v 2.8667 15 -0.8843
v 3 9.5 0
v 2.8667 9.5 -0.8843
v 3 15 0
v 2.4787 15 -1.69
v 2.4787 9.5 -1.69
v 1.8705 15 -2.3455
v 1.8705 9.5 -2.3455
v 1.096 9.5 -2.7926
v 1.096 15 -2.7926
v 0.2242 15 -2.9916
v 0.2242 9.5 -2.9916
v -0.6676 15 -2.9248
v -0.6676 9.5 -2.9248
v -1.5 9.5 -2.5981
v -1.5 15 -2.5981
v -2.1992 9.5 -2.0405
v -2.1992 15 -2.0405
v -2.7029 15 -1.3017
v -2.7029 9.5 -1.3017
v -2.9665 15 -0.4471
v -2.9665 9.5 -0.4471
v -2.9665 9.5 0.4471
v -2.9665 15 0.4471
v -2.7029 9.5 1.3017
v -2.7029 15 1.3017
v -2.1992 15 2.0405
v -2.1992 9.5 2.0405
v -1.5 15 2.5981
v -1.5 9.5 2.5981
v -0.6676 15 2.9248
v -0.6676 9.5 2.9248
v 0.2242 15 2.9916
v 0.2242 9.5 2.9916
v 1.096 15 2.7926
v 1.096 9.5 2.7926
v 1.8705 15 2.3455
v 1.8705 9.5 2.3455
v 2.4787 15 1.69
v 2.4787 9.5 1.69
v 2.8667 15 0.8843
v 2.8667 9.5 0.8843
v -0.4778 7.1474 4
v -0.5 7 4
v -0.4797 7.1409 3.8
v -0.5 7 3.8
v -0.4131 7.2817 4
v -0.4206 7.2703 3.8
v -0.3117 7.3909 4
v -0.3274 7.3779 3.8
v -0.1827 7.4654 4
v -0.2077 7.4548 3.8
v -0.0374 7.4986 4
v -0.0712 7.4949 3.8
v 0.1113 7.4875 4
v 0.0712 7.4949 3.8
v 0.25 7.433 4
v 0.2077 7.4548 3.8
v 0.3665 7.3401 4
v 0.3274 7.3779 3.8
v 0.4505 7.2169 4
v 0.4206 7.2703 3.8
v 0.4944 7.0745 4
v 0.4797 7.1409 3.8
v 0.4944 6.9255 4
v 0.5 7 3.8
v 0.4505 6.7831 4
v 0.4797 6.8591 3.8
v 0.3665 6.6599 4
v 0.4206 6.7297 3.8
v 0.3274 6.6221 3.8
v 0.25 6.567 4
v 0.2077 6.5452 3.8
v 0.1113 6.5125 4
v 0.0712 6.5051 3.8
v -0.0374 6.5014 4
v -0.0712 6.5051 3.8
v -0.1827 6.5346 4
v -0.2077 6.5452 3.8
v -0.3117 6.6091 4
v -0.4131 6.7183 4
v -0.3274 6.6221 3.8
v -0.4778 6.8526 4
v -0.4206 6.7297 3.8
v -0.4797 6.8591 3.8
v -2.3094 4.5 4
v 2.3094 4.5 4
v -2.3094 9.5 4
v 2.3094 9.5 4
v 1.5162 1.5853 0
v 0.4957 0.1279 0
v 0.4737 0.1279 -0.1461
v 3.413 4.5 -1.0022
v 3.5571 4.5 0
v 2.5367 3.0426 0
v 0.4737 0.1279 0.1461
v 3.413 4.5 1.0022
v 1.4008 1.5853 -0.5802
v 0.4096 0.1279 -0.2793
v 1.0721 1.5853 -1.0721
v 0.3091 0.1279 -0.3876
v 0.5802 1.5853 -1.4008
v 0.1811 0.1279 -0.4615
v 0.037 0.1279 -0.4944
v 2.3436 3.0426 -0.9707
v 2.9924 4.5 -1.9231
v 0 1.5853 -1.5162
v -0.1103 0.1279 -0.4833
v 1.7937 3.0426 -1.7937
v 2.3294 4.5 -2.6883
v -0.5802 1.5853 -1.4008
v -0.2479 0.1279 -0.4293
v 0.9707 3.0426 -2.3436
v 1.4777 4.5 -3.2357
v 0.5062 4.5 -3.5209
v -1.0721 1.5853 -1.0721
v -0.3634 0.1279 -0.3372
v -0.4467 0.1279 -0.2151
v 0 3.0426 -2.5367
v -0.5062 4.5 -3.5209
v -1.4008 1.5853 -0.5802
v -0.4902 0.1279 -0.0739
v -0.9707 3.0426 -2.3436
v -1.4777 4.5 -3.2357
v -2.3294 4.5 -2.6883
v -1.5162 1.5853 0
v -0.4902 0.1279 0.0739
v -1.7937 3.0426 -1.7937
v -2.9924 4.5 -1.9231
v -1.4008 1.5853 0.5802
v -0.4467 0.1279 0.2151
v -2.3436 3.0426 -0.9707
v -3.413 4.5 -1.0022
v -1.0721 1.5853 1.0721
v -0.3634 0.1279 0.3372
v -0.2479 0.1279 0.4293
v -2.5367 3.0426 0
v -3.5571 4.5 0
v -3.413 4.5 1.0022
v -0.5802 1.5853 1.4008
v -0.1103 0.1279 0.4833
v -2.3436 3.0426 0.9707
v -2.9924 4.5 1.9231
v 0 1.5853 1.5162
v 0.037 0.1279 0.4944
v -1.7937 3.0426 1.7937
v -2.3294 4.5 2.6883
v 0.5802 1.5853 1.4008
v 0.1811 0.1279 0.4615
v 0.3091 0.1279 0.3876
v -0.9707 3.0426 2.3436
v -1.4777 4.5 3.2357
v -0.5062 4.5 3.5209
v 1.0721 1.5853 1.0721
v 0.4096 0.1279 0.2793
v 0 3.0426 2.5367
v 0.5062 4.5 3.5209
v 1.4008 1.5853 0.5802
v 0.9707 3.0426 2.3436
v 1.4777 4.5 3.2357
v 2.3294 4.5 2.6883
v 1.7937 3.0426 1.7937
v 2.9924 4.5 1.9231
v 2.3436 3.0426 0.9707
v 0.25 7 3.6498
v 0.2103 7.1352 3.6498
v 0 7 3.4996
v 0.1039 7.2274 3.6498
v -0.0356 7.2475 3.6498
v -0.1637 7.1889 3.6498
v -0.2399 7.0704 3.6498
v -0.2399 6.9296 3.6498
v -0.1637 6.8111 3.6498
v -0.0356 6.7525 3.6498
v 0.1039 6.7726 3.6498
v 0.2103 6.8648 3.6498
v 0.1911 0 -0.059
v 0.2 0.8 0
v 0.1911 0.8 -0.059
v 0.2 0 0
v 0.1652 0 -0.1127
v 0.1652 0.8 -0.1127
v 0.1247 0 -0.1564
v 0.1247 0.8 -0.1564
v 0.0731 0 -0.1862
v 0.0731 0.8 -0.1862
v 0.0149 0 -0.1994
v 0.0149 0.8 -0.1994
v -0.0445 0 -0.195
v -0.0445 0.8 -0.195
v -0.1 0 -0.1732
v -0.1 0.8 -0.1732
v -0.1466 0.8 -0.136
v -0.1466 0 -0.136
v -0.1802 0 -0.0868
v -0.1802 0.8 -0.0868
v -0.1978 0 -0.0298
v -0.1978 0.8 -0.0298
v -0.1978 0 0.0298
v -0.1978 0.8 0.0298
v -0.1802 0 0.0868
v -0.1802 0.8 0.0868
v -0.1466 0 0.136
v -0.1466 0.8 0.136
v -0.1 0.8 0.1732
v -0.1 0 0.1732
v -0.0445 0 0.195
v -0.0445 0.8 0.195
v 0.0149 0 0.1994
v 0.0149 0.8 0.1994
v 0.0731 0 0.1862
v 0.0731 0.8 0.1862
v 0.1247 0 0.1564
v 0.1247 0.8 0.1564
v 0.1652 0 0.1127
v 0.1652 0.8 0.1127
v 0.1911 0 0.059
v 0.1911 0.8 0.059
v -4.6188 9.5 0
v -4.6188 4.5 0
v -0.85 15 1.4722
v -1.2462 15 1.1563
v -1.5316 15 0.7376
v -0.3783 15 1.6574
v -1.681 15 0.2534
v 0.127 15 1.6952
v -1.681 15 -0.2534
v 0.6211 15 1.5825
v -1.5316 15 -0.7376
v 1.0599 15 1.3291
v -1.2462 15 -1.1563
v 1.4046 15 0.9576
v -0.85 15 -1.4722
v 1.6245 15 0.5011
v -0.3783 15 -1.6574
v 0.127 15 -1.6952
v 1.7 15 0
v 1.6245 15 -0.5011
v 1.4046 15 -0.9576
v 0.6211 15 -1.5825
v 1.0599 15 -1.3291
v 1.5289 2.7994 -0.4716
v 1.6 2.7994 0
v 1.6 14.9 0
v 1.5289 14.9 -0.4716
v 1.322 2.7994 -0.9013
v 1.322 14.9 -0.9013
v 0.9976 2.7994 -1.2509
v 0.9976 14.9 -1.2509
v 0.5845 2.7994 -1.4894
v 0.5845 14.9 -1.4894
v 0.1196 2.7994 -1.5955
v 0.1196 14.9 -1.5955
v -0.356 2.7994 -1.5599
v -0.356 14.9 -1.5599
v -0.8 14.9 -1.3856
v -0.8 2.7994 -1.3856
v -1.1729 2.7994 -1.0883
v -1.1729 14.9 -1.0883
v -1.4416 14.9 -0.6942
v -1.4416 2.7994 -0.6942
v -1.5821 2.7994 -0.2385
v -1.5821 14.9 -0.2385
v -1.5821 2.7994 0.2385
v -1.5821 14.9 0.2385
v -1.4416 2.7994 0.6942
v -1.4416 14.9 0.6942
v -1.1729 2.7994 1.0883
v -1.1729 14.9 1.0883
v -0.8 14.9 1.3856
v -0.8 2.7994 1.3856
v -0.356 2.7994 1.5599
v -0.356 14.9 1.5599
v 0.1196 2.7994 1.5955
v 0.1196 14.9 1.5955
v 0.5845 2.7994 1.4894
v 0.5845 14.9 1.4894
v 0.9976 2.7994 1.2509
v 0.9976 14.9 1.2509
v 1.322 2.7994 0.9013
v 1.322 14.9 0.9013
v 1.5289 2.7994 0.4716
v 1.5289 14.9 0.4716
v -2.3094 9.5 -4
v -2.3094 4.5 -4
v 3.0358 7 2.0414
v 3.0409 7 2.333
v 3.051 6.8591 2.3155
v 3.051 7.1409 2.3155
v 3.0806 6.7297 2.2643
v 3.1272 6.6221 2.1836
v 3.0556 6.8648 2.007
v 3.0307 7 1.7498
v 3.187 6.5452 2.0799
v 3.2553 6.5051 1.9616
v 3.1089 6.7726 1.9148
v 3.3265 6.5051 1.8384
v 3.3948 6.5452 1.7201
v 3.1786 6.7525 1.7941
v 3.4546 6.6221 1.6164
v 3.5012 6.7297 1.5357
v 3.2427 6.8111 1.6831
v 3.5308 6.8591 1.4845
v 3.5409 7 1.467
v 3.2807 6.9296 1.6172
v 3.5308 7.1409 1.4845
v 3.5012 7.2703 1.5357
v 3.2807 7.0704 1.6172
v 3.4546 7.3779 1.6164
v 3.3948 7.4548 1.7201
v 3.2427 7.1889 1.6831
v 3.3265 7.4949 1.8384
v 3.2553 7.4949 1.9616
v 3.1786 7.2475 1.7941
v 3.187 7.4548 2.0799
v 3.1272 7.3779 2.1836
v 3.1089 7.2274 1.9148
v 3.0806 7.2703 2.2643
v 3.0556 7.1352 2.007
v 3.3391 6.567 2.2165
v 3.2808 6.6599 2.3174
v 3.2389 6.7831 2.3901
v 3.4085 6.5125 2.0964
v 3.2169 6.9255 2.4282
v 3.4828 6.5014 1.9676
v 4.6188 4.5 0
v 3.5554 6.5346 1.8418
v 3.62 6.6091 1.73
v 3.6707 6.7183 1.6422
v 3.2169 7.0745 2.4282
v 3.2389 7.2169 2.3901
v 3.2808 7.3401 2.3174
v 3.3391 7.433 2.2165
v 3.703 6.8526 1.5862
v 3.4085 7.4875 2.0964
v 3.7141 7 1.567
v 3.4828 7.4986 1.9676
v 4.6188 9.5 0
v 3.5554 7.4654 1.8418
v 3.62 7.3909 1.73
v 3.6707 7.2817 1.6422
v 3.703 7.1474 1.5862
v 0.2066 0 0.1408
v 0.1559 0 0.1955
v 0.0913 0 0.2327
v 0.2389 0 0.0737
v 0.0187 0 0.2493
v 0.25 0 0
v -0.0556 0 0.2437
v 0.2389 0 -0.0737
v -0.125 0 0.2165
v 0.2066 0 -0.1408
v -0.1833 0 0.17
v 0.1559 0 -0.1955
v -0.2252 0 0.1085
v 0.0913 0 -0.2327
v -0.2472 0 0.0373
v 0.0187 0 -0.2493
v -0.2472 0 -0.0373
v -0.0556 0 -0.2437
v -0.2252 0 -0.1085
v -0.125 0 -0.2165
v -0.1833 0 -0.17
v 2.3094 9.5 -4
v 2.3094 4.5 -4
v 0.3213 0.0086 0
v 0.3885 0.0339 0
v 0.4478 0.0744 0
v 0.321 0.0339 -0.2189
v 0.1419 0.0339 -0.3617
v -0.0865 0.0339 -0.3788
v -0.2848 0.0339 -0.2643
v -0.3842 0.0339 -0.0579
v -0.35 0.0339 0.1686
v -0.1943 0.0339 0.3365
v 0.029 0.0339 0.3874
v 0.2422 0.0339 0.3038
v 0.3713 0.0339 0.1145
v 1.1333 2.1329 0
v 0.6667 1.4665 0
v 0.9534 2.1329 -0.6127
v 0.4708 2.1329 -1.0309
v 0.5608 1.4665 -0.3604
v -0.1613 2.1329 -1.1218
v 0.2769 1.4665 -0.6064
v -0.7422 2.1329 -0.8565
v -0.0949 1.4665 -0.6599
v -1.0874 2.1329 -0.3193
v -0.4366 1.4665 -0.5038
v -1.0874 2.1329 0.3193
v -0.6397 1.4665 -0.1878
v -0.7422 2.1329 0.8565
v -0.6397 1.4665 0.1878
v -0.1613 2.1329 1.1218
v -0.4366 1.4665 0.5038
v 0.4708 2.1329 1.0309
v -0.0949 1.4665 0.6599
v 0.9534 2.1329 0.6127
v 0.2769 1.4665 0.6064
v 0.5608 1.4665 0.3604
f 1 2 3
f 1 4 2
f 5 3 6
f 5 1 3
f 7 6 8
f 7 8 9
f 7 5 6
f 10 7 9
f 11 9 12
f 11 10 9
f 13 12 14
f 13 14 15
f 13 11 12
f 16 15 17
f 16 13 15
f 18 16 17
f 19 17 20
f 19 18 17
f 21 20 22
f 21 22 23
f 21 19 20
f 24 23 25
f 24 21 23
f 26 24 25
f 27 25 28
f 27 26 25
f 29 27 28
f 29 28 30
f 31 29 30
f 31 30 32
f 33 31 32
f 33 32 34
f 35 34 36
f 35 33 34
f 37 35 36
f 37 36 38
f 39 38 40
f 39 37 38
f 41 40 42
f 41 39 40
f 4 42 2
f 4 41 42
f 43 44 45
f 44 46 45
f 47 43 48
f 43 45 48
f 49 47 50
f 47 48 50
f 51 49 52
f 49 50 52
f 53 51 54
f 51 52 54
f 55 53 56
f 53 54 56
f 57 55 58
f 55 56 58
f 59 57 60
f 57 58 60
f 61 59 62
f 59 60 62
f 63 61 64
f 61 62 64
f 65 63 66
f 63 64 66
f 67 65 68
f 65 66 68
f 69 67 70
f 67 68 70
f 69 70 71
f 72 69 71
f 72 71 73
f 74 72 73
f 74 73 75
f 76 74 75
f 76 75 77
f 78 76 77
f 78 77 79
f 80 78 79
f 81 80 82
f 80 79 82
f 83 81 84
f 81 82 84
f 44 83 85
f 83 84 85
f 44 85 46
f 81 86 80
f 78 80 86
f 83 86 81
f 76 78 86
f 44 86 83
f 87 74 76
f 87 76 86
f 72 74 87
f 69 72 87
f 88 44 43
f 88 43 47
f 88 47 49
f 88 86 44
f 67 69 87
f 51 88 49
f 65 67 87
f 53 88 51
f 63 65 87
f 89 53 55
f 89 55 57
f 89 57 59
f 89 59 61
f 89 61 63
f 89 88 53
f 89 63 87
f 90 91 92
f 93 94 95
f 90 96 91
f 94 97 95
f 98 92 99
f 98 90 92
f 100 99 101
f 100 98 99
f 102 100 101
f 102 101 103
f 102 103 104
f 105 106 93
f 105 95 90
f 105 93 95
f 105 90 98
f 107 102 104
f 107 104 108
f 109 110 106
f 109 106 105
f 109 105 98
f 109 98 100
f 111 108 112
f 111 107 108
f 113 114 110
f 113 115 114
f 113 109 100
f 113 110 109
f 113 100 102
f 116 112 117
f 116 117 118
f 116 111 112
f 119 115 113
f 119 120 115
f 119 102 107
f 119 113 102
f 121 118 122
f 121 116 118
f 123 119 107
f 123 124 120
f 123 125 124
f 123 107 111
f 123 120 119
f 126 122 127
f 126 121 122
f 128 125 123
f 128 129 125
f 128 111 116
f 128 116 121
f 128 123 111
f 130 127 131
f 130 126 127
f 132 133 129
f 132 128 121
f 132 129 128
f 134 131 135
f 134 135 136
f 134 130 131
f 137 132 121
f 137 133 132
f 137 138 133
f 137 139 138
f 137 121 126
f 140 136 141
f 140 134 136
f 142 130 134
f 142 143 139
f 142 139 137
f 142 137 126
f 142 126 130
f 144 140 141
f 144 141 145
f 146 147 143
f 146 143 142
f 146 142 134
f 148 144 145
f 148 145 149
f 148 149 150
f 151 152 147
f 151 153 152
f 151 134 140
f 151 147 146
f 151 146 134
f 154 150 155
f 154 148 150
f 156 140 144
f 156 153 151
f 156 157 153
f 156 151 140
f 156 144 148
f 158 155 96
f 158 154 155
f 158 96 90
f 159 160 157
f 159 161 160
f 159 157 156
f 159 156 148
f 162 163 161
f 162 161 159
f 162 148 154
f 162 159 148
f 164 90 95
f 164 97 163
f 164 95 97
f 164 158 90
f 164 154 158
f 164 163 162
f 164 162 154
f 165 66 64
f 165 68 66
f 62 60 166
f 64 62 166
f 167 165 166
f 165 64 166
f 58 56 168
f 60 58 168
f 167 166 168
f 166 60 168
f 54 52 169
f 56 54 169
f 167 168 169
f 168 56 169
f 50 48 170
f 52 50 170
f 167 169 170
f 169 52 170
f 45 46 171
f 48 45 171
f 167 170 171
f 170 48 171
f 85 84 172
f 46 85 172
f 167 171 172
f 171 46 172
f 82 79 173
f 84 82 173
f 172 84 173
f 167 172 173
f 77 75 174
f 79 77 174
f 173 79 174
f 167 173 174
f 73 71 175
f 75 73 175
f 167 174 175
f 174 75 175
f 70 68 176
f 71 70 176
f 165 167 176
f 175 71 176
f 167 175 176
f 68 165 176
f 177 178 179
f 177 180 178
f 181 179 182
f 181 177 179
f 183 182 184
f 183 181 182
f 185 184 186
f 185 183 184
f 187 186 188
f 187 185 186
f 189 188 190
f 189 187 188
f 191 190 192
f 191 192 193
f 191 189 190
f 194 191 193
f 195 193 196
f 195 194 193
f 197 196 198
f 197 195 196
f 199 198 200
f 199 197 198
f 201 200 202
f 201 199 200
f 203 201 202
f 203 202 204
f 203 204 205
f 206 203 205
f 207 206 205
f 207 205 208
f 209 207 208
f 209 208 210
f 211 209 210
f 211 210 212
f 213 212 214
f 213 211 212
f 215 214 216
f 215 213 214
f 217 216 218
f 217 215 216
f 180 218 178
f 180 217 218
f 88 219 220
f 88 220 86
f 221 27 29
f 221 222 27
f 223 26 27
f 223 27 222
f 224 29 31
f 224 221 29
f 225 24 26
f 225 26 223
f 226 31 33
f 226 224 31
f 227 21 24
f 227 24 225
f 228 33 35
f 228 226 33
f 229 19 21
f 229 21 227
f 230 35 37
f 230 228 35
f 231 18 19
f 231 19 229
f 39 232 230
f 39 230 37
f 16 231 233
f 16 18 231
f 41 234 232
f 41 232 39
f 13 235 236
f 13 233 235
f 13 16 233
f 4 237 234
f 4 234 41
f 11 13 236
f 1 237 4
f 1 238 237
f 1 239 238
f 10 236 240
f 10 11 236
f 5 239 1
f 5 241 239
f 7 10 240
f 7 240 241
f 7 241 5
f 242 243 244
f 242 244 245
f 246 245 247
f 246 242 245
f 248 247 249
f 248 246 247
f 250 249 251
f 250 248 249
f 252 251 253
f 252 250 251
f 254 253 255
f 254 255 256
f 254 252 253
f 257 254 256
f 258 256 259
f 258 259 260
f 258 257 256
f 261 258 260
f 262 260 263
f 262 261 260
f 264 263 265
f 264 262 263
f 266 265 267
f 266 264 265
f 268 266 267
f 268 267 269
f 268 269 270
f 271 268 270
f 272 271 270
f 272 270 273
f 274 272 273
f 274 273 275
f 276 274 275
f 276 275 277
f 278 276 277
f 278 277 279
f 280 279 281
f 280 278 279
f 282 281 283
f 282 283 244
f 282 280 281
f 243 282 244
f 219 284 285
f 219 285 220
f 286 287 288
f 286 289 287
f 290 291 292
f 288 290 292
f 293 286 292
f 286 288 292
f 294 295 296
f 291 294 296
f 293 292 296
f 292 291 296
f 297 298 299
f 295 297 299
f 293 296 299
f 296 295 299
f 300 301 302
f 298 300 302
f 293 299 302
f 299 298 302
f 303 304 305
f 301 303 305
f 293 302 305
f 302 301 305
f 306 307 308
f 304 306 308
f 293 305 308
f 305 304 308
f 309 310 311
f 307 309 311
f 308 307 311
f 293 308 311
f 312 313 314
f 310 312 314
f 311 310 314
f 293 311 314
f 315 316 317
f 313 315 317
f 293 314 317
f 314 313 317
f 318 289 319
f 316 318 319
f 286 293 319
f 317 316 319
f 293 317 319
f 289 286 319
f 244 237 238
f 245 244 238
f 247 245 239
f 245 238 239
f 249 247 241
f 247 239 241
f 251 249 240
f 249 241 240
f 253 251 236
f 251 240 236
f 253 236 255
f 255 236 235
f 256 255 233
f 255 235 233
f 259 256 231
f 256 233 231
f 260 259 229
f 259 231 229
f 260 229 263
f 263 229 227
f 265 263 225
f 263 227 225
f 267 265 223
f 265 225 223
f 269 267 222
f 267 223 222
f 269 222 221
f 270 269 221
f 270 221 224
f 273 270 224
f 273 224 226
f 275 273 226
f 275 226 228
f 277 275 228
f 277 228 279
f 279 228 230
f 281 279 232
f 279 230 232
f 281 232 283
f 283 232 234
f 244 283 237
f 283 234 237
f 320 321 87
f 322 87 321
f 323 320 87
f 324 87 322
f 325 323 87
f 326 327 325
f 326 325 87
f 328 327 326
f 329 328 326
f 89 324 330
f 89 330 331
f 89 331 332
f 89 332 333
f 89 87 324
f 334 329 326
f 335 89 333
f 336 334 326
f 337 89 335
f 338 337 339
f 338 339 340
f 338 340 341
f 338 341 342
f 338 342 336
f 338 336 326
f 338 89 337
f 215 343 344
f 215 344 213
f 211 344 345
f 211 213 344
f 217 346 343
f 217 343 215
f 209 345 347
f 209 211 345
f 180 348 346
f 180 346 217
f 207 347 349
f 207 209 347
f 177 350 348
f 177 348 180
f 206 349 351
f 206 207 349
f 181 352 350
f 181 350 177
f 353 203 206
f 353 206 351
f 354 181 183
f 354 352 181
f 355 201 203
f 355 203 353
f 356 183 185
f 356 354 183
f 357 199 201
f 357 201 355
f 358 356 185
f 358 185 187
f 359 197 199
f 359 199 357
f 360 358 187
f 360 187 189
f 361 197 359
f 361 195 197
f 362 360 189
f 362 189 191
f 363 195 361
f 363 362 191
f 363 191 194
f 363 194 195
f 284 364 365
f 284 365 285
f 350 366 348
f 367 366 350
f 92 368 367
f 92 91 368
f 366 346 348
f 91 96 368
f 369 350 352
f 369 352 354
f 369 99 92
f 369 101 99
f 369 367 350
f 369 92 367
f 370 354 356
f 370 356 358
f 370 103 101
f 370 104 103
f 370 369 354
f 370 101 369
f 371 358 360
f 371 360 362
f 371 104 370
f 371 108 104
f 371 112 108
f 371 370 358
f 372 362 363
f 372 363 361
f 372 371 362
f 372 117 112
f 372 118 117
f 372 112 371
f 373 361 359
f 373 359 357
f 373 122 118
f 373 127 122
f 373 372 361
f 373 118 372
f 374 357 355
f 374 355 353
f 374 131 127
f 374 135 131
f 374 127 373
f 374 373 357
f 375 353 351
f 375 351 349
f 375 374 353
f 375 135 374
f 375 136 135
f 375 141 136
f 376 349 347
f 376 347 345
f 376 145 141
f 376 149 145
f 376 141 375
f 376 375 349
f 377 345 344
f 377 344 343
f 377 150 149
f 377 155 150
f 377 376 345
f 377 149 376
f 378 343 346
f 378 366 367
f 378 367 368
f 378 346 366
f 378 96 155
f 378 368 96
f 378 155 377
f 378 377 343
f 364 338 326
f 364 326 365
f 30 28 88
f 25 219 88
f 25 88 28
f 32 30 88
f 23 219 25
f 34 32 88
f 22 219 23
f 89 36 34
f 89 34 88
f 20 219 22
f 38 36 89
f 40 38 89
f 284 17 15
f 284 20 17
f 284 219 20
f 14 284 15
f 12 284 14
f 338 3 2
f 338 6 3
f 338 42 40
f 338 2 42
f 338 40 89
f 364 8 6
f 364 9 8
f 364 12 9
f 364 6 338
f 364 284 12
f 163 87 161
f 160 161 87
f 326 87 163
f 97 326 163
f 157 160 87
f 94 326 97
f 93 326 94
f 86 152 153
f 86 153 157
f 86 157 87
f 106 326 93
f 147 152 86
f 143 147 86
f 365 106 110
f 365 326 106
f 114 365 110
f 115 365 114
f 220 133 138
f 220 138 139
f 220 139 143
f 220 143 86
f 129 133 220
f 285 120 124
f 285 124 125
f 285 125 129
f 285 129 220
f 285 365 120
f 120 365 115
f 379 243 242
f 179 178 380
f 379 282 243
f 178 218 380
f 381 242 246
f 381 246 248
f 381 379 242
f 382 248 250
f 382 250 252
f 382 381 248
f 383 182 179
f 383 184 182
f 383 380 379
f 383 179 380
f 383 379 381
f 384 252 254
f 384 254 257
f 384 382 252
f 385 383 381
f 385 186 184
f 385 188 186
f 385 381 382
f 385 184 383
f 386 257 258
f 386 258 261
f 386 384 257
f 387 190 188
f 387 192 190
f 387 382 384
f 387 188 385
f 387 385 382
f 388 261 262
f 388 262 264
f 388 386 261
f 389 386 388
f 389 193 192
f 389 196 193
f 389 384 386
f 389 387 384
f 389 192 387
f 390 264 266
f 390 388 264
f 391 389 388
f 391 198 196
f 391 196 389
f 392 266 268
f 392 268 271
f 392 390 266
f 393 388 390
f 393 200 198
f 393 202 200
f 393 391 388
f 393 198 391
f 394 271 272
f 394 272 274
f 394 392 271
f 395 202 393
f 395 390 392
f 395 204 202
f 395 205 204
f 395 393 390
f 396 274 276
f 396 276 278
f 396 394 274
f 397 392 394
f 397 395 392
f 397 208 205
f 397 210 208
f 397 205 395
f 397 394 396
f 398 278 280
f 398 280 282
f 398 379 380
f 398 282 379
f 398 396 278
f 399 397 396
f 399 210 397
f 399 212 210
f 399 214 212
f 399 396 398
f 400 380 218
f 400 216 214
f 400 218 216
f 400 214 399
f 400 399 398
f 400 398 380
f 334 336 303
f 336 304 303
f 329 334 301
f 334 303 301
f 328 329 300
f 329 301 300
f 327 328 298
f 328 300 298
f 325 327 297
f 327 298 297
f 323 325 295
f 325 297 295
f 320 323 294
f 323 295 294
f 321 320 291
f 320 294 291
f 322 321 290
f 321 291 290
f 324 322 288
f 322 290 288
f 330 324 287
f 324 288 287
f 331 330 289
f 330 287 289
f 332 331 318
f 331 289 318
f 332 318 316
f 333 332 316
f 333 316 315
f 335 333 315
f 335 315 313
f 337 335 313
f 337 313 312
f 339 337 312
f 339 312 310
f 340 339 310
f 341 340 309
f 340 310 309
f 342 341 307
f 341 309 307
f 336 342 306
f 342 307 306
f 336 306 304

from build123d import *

# Parameters (mm, degrees)
CORTAR_EXTRUIR1_START                       = 1
CROQUIS2_R                                  = 7.058141728
CORTAR_EXTRUIR1_DEPTH                       = 7
CHAFL_N1_SIZE                               = 0.1
DI_METRO_DE_TALADRO_1_0_1_1_D               = 1
DI_METRO_DE_TALADRO_1_0_1_1_DEPTH           = 0.2
DI_METRO_DE_TALADRO_1_0_1_1_TIP             = 0.30043031
DI_METRO_DE_TALADRO_1_0_1_1_ON_FACE_2_D     = 1
DI_METRO_DE_TALADRO_1_0_1_1_ON_FACE_2_DEPTH = 0.2
DI_METRO_DE_TALADRO_1_0_1_1_ON_FACE_2_TIP   = 0.30043031


with BuildPart() as part:
    # Croquis1 → Revolución1 (revolve)
    with BuildSketch(Plane.XY):
        with BuildLine():
            Line((0.2, 0), (0.25, 0))
            ThreePointArc((0.25, 0), (0.388524584, 0.03389675), (0.495745613, 0.127927069))
            Line((0.495745613, 0.127927069), (3.557104037, 4.5))
            Line((3.557104037, 4.5), (5.706019053, 4.5))
            Line((5.706019053, 4.5), (5.706019053, 7.568968696))
            Line((5.706019053, 7.568968696), (7.058141728, 9.5))
            Line((7.058141728, 9.5), (3, 9.5))
            Line((3, 9.5), (3, 15))
            Line((3, 15), (1.6, 15))
            Line((1.6, 15), (1.6, 2.799407209))
            Line((1.6, 2.799407209), (0.2, 0.8))
            Line((0.2, 0.8), (0.2, 0))
        make_face()
    revolve(axis=Axis((0, 0, 0), (0, 1, 0)))

    # Croquis2 → Cortar-Extruir1 (cut)
    with BuildSketch(Plane(origin=(0, 9.5, 0), x_dir=(1, 0, 0), z_dir=(0, 1, 0)).offset(CORTAR_EXTRUIR1_START)):
        Circle(CROQUIS2_R)
        Polygon((2.309401077, 4), (-2.309401077, 4), (-4.618802154, 0), (-2.309401077, -4), (2.309401077, -4), (4.618802154, 0), align=None, mode=Mode.SUBTRACT)
    extrude(amount=-CORTAR_EXTRUIR1_DEPTH, mode=Mode.SUBTRACT)

    # Chaflán1
    chafl_n1_edges = [part.edges().sort_by_distance(p)[0] for p in [
        (-1.6, 15, 0),
    ]]
    chamfer(chafl_n1_edges, length=CHAFL_N1_SIZE)

    # Diámetro de taladro Ø1.0 (1)1
    with Locations(Plane(origin=(3.464101615, 7, 2), x_dir=(-0.5, 0, 0.866025404), z_dir=(0.866025404, 0, 0.5))):
        with Locations((0, 0)):
            Hole(DI_METRO_DE_TALADRO_1_0_1_1_D / 2, depth=DI_METRO_DE_TALADRO_1_0_1_1_DEPTH)
            with Locations((0, 0, -(DI_METRO_DE_TALADRO_1_0_1_1_DEPTH + DI_METRO_DE_TALADRO_1_0_1_1_TIP / 2))):  # 118° drill point
                Cone(0, DI_METRO_DE_TALADRO_1_0_1_1_D / 2, DI_METRO_DE_TALADRO_1_0_1_1_TIP, mode=Mode.SUBTRACT)

    # Diámetro de taladro Ø1.0 (1)1 on face 2
    with Locations(Plane(origin=(0, 7, 4), x_dir=(1, 0, 0), z_dir=(0, 0, 1))):
        with Locations((0, 0)):
            Hole(DI_METRO_DE_TALADRO_1_0_1_1_ON_FACE_2_D / 2, depth=DI_METRO_DE_TALADRO_1_0_1_1_ON_FACE_2_DEPTH)
            with Locations((0, 0, -(DI_METRO_DE_TALADRO_1_0_1_1_ON_FACE_2_DEPTH + DI_METRO_DE_TALADRO_1_0_1_1_ON_FACE_2_TIP / 2))):  # 118° drill point
                Cone(0, DI_METRO_DE_TALADRO_1_0_1_1_ON_FACE_2_D / 2, DI_METRO_DE_TALADRO_1_0_1_1_ON_FACE_2_TIP, mode=Mode.SUBTRACT)


solid = part.part
